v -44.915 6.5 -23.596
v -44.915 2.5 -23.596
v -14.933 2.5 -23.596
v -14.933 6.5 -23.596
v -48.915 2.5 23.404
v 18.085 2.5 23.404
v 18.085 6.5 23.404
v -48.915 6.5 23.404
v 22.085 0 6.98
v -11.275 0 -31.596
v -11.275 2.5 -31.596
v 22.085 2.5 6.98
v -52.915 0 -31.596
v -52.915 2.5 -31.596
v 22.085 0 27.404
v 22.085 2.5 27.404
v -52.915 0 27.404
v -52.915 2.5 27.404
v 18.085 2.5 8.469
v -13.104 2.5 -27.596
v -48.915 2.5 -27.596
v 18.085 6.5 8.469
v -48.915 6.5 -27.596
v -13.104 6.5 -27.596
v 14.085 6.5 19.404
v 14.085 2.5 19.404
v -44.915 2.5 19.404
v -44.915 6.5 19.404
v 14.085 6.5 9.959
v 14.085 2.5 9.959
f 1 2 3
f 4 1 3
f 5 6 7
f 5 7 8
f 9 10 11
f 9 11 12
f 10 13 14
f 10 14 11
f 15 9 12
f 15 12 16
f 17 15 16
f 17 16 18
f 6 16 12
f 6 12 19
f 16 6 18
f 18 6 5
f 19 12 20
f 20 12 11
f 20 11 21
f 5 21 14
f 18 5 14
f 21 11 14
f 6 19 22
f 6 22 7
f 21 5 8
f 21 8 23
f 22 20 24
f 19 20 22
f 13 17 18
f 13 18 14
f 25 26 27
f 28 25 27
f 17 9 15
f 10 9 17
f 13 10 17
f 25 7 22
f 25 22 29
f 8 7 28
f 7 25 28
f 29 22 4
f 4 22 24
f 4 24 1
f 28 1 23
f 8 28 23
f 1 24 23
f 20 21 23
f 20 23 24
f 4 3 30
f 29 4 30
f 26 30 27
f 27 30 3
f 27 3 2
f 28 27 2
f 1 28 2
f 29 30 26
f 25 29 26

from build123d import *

# Parameters (mm, degrees)
BOSS_EXTRUDE2_DEPTH = 2.5
BOSS_EXTRUDE3_DEPTH = 4


with BuildPart() as part:
    # Sketch1 → Boss-Extrude2 (new body)
    with BuildSketch(Plane(origin=(0, 0, 0), x_dir=(1, 0, 0), z_dir=(0, 1, 0))):
        Polygon((-52.914786993, 31.596385048), (-11.274786993, 31.596385048), (22.085213007, -6.979648962), (22.085213007, -27.403614952), (-52.914786993, -27.403614952), align=None)
    extrude(amount=BOSS_EXTRUDE2_DEPTH)

    # Sketch2 → Boss-Extrude3 (add)
    with BuildSketch(Plane(origin=(0, 2.5, 0), x_dir=(1, 0, 0), z_dir=(0, 1, 0))):
        Polygon((18.085213007, -23.403614952), (-48.914786993, -23.403614952), (-48.914786993, 27.596385048), (-13.10390193, 27.596385048), (18.085213007, -8.469333134), align=None)
        Polygon((14.085213007, -19.403614952), (-44.914786993, -19.403614952), (-44.914786993, 23.596385048), (-14.933016866, 23.596385048), (14.085213007, -9.959017305), align=None, mode=Mode.SUBTRACT)
    extrude(amount=BOSS_EXTRUDE3_DEPTH)


solid = part.part
